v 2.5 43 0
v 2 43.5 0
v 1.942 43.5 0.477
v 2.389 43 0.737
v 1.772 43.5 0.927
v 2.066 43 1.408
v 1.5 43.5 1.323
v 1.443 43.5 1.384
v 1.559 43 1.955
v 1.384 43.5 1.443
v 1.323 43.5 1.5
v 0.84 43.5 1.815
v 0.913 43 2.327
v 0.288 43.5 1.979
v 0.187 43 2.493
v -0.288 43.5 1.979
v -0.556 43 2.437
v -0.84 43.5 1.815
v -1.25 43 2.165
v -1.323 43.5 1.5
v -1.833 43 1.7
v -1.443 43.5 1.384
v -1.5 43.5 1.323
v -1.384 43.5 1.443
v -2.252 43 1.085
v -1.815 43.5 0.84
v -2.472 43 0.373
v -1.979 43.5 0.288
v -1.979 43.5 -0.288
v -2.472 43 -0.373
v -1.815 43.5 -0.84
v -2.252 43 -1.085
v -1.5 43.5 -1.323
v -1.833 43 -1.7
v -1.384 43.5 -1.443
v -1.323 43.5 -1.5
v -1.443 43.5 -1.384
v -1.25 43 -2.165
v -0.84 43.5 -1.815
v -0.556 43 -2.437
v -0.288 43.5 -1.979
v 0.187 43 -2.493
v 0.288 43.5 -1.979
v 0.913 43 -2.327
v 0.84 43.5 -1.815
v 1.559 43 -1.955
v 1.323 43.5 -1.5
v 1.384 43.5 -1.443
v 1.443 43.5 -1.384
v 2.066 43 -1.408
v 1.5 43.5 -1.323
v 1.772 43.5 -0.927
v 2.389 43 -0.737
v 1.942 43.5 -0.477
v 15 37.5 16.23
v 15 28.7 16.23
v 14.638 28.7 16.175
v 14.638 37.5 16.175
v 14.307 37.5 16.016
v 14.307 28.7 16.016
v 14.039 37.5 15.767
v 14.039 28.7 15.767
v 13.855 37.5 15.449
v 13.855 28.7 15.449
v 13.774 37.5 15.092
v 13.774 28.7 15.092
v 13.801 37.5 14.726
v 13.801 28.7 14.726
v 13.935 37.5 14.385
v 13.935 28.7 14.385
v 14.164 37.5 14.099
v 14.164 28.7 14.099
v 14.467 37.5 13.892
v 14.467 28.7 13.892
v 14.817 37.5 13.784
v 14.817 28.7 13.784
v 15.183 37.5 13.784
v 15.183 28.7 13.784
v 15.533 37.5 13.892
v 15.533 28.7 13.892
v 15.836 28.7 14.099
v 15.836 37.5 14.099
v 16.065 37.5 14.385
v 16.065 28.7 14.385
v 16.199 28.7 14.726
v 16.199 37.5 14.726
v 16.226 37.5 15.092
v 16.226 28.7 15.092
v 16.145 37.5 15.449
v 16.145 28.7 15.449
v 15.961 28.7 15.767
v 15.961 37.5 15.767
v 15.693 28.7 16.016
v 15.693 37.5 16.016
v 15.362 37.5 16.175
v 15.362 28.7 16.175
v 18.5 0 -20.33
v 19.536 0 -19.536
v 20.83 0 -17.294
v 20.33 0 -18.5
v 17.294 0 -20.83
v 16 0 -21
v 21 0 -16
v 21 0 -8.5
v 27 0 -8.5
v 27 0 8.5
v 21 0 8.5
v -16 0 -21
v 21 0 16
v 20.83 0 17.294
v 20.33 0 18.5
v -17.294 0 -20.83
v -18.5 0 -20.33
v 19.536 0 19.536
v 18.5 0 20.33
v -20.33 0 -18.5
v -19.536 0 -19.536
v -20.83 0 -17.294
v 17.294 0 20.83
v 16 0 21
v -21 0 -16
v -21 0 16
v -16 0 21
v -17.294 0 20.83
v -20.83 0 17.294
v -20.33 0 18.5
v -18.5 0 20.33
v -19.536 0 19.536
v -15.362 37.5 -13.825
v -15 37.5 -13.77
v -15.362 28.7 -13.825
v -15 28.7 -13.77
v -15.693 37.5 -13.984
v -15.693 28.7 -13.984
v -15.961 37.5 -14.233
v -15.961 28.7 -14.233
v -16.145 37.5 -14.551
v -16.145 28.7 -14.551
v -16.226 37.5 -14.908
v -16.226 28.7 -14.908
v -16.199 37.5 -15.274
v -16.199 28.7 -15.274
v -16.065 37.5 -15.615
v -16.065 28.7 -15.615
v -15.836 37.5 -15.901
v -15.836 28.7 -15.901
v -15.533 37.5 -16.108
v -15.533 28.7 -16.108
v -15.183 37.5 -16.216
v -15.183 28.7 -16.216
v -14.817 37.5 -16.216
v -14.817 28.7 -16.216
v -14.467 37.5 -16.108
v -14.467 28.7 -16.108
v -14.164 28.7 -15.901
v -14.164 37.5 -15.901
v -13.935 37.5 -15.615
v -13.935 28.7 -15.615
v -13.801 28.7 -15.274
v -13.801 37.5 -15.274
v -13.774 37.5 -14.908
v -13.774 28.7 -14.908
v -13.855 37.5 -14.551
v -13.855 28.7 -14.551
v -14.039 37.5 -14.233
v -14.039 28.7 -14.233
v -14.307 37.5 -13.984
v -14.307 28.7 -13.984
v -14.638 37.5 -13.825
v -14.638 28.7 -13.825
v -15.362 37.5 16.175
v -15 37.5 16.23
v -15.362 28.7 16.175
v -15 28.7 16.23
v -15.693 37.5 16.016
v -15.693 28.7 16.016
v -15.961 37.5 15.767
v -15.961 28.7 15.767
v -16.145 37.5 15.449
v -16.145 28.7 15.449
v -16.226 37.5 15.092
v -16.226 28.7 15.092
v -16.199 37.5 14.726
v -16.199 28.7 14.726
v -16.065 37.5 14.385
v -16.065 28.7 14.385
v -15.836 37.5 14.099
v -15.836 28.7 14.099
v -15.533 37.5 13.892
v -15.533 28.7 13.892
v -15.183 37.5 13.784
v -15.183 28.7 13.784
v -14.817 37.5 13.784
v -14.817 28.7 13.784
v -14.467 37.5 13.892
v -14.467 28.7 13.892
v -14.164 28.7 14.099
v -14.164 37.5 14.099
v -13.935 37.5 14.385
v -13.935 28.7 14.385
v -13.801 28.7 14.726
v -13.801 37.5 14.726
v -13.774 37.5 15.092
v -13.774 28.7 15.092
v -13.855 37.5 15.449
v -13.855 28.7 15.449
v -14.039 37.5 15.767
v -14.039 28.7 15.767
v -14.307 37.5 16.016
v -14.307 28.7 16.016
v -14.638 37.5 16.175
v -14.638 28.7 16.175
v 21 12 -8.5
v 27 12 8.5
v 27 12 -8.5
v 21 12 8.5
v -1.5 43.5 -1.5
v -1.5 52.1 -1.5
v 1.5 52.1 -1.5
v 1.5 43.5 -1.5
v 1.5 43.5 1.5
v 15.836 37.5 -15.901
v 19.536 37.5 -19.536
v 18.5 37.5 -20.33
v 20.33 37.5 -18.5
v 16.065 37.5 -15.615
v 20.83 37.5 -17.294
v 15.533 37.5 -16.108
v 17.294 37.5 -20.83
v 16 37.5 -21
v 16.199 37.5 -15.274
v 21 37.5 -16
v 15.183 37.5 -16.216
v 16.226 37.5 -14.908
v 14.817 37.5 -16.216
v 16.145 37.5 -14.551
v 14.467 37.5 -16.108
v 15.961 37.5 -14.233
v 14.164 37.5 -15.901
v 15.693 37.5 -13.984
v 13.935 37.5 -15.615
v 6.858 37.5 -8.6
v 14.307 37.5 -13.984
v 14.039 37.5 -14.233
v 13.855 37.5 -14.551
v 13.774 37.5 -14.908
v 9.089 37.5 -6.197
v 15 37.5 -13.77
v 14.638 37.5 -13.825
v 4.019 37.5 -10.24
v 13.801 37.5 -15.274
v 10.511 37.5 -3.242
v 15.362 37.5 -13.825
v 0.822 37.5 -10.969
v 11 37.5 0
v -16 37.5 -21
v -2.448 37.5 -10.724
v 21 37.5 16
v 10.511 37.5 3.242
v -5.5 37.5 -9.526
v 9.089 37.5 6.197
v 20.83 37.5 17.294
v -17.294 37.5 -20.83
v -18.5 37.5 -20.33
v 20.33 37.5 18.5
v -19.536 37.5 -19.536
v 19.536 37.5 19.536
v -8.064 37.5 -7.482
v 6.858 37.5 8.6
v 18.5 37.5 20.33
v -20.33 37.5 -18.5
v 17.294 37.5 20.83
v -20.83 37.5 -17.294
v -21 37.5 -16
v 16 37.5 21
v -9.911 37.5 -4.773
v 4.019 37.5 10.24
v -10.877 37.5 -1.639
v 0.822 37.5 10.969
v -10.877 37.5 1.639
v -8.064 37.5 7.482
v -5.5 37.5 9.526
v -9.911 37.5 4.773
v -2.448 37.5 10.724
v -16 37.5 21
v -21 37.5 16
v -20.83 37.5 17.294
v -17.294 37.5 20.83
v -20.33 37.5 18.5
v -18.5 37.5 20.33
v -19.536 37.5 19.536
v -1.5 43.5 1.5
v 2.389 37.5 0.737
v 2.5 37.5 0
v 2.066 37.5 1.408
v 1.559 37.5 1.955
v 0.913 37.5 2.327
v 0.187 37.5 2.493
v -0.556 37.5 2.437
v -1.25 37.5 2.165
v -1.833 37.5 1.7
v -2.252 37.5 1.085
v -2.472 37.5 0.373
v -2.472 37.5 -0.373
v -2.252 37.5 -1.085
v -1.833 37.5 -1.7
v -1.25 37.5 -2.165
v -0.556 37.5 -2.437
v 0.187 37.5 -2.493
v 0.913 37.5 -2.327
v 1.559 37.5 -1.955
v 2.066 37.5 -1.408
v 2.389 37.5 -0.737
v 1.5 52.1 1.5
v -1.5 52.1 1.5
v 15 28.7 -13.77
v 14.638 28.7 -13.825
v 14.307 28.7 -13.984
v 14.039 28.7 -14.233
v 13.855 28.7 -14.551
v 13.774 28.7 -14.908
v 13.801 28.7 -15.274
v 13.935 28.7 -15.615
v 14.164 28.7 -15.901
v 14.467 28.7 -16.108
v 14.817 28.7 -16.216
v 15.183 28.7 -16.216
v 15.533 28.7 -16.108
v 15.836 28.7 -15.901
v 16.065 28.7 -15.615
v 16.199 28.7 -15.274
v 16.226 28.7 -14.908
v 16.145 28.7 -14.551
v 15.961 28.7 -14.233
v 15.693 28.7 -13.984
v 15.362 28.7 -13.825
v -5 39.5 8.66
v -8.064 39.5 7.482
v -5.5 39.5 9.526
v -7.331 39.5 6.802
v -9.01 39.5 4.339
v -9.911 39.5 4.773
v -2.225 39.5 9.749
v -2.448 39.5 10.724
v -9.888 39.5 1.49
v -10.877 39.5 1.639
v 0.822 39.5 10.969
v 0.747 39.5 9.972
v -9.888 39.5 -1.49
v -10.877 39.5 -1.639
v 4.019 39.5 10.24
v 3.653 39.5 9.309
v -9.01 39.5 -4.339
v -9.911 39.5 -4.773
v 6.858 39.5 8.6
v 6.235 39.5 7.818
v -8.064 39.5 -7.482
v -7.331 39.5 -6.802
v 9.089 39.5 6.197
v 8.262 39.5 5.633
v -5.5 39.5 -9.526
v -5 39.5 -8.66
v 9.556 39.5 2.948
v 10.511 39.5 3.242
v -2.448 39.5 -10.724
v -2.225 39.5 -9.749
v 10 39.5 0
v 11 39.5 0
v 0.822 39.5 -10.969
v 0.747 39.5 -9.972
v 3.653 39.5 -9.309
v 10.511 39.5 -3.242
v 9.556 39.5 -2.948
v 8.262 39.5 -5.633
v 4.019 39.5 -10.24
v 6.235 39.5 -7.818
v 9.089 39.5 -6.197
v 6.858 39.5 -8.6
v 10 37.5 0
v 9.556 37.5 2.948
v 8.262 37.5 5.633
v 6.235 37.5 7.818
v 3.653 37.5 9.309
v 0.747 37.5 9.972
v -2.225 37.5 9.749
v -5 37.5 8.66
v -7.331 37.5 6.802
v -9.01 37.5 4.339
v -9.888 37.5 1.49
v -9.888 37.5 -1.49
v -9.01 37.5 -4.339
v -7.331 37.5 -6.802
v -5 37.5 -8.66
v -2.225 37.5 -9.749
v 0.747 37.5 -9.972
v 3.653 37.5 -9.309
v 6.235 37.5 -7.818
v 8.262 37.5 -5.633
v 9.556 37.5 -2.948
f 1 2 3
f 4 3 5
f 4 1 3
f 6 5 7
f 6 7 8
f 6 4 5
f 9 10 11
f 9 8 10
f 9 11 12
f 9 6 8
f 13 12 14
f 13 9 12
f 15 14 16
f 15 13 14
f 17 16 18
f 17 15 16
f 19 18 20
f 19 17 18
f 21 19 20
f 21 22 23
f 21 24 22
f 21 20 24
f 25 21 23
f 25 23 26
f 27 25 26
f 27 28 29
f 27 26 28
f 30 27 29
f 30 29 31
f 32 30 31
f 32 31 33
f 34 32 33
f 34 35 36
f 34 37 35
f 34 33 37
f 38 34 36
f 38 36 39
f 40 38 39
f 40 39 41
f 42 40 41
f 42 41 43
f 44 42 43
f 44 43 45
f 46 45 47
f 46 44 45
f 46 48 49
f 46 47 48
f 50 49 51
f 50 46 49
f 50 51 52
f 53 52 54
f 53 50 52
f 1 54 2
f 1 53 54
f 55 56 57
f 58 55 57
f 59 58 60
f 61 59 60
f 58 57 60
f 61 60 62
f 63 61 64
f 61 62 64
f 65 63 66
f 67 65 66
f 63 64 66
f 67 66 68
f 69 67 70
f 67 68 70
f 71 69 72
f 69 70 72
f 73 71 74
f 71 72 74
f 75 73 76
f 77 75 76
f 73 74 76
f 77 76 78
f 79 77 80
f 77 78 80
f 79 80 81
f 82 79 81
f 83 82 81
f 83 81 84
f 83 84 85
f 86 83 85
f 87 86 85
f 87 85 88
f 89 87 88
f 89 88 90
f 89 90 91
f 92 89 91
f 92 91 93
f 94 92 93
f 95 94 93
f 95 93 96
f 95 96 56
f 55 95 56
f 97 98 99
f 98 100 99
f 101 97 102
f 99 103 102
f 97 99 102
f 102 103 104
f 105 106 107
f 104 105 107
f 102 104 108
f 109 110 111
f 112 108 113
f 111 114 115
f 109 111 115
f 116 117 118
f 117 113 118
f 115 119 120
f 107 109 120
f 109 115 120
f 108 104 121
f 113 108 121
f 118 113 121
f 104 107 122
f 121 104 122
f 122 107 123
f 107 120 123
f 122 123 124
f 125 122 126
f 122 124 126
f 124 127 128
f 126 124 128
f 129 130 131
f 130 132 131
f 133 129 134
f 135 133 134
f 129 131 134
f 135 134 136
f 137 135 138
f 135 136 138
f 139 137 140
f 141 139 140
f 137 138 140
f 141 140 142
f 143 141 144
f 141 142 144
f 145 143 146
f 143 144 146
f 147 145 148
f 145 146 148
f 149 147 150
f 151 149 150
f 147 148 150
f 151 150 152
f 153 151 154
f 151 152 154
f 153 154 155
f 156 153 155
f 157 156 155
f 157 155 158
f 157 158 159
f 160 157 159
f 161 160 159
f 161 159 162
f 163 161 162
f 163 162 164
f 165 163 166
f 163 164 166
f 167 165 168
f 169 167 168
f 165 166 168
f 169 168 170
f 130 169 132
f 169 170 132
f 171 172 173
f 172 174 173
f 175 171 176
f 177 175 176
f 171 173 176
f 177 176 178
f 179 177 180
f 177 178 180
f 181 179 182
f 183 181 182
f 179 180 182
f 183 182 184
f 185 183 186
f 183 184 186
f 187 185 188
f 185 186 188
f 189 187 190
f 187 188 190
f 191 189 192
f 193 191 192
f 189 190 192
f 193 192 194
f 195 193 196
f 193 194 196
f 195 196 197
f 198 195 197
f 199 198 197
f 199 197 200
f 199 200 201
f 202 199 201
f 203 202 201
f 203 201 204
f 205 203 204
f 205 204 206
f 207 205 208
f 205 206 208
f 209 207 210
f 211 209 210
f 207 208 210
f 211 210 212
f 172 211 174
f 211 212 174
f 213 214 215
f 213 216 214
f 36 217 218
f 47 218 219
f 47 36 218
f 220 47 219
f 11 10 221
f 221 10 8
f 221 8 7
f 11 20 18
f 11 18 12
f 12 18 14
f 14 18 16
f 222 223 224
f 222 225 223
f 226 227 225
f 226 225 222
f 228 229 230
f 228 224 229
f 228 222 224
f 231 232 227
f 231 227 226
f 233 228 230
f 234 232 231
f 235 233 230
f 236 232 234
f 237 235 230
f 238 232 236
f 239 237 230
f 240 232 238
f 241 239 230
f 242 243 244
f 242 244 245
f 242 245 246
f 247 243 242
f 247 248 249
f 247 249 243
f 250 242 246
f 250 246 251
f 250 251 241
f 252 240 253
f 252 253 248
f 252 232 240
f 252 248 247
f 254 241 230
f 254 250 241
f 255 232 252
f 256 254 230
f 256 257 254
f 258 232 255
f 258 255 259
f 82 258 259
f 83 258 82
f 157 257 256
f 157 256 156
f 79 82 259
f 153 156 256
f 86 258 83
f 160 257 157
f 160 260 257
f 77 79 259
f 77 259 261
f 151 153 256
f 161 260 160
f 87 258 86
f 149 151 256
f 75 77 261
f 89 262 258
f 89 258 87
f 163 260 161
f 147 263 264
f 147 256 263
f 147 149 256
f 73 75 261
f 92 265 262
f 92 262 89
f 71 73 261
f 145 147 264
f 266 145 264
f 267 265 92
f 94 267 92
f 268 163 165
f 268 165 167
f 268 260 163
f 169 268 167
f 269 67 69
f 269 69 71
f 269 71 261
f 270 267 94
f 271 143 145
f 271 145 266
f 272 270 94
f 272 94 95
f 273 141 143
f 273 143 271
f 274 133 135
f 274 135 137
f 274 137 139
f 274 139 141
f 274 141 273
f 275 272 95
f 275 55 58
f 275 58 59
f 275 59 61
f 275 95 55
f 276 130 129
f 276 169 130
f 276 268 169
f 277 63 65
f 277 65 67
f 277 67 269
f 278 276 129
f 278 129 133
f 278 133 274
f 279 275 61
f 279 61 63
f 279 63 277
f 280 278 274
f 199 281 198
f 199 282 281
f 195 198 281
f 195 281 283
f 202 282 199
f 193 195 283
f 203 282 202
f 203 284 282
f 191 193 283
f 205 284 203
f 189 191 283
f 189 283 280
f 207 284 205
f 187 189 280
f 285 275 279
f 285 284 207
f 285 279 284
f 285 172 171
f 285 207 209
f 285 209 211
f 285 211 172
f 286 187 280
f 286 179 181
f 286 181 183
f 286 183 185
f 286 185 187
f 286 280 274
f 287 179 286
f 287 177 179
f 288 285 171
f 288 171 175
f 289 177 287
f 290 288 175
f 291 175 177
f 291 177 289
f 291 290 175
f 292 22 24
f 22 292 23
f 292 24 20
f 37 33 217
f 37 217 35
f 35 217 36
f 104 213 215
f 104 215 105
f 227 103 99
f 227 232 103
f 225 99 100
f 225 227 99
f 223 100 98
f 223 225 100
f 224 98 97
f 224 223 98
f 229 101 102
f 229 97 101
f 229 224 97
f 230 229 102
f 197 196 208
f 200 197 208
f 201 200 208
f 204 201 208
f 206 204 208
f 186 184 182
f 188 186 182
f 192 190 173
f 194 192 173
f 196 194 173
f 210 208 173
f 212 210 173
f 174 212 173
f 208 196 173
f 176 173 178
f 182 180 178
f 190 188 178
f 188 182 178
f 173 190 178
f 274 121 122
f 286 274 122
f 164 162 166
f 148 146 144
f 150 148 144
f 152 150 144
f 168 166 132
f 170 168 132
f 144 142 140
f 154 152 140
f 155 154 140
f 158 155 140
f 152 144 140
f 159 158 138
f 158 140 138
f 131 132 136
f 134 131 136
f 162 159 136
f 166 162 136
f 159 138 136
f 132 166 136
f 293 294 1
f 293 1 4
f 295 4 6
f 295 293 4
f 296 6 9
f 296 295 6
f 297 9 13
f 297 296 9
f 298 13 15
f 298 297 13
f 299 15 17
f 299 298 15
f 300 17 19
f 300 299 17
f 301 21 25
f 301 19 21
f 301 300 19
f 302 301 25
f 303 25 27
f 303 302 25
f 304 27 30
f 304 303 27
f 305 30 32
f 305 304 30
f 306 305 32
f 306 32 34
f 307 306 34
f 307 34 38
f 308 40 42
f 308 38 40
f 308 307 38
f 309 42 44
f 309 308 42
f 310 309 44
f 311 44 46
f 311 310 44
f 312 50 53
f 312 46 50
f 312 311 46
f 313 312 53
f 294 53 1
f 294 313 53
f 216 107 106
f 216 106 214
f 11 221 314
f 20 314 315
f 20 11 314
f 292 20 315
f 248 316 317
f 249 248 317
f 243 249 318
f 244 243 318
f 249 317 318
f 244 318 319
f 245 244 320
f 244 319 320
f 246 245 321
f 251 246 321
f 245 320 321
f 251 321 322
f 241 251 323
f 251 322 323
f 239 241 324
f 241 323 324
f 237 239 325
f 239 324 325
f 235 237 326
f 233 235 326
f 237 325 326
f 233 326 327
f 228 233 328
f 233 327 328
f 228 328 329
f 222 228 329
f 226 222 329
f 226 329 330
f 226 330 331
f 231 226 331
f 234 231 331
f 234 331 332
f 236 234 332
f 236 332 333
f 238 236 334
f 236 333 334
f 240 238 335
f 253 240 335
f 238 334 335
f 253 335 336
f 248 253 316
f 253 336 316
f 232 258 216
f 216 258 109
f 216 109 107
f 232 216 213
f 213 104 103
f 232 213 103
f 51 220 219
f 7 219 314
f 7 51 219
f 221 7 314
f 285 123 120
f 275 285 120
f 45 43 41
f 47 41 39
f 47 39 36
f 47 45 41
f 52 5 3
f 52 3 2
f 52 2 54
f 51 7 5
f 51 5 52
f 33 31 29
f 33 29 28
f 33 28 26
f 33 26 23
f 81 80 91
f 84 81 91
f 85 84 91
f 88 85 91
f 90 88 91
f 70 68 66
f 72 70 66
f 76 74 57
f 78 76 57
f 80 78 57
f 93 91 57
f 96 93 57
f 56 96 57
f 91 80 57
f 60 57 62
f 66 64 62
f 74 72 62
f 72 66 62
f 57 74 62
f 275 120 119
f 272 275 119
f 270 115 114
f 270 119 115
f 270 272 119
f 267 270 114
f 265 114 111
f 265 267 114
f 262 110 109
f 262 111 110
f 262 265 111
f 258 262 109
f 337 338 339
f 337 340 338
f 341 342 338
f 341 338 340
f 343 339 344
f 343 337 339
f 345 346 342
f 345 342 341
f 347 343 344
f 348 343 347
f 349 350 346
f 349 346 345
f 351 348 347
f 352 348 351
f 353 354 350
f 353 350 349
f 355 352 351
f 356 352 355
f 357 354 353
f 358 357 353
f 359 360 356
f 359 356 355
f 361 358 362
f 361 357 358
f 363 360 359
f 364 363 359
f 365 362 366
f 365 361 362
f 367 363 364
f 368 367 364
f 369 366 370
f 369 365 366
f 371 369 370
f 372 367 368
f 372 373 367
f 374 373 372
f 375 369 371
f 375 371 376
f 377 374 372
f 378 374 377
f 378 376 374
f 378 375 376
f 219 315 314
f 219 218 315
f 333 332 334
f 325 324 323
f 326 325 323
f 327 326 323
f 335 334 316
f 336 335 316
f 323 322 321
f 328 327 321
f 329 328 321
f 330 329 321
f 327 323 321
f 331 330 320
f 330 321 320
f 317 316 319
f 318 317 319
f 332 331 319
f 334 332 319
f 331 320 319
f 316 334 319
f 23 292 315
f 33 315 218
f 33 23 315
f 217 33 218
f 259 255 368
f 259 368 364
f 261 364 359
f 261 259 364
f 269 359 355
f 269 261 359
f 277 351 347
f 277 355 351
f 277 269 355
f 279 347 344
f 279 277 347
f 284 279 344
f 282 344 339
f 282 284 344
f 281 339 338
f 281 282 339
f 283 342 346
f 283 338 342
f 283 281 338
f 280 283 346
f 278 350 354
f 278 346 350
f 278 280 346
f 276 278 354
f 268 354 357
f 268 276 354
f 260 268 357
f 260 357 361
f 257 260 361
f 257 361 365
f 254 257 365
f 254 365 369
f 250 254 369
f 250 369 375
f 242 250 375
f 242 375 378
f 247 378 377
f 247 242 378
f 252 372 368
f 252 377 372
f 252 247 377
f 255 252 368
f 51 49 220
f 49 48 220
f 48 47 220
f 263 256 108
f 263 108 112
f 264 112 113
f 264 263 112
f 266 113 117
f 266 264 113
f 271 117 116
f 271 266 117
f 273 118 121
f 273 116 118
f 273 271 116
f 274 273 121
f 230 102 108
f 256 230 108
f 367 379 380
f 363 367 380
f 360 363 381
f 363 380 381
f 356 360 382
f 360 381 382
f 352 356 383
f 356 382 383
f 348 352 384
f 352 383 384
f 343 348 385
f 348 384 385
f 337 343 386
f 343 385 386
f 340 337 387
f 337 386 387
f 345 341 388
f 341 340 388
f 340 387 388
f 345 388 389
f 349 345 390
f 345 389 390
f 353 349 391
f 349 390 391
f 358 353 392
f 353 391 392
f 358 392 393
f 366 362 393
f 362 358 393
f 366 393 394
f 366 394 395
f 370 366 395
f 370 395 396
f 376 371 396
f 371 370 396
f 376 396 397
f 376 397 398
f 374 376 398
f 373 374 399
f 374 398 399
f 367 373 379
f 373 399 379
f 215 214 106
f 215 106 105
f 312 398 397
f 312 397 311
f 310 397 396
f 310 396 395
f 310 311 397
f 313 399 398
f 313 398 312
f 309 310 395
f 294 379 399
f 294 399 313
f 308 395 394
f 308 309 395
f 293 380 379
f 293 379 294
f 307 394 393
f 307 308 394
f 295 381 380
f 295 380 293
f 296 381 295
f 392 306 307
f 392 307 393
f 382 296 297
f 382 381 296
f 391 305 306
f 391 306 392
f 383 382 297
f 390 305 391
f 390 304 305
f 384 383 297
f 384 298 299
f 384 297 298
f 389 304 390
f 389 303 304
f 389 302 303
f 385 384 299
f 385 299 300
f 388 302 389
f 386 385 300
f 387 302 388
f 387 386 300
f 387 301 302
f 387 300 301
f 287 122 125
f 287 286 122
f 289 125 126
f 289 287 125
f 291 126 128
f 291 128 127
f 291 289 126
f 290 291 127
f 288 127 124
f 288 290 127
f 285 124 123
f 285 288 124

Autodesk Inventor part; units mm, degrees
ref_plane "YZ Plane" through (0, 0, 0) normal (1, 0, 0) x (0, 1, 0)
ref_plane "XZ Plane" through (0, 0, 0) normal (0, 1, 0) x (-1, 0, 0)
ref_plane "XY Plane" through (0, 0, 0) normal (0, 0, 1) x (1, 0, 0)
sketch "Sketch1" plane through (0, 0, 0) normal (0, 1, 0) x (-1, 0, 0)
  line L0 (21, 21) -> (-21, 21)
  line L1 (-21, 21) -> (-21, -21)
  line L2 (-21, -21) -> (21, -21)
  line L3 (21, -21) -> (21, 21)
  line L4 (21, 21) -> (-21, -21) construction
  line L5 (-21, 21) -> (21, -21) construction
  point P0 (0, 0)
  dimension "d0" = 42
  dimension "d1" = 42
extrude "Extrusion1" add sketch "Sketch1" along normal blind 37.5
fillet "Fillet1" radius 5 4 edges at (21, 18.75, 21) (21, 18.75, -21) (-21, 18.75, -21) (-21, 18.75, 21)
sketch "Sketch2" plane through (0, 37.5, 0) normal (0, 1, 0) x (1, 0, 0)
  arc A0 (-21, -16) -> (-16, -21) centre (-16, -16) ccw projected
  line L0 (-16, -21) -> (16, -21) projected
  arc A1 (16, -21) -> (21, -16) centre (16, -16) ccw projected
  line L1 (21, -16) -> (21, 16) projected
  arc A2 (21, 16) -> (16, 21) centre (16, 16) ccw projected
  line L2 (16, 21) -> (-16, 21) projected
  arc A3 (-16, 21) -> (-21, 16) centre (-16, 16) ccw projected
  line L3 (-21, 16) -> (-21, -16) projected
  circle A4 centre (0, 0) radius 11
  circle A5 centre (0, 0) radius 10
  point P0 (-15, -15)
  point P1 (15, -15)
  point P2 (15, 15)
  point P3 (-15, 15)
  dimension "d5" = 22
  dimension "d6" = 20
  dimension "d7" = 6
  dimension "d8" = 6
  dimension "d11" = 360
extrude "Extrusion2" add sketch "Sketch2" along normal blind 2 contours A4
hole "Hole1" at (-15, 37.5, 15) at (15, 37.5, 15) at (15, 37.5, -15) at (-15, 37.5, -15) direction (0, -1, 0) diameter 2.459 depth 8.8 thread size "M3x0.5" class "6H" standard "ISO Metric profile"
sketch "Sketch3" plane through (0, 37.5, 0) normal (0, 1, 0) x (1, 0, 0)
  circle A0 centre (0, 0) radius 2.5
  dimension "d22" = 5
extrude "Extrusion3" add sketch "Sketch3" along normal blind 6
chamfer "Chamfer1" distance 0.5 angle 45 1 edges at (-2.5, 43.5, 0)
sketch "Sketch4" plane through (0, 43.5, 0) normal (0, 1, 0) x (1, 0, 0)
  line L0 (-1.5, 1.5) -> (1.5, 1.5)
  line L1 (1.5, 1.5) -> (1.5, -1.5)
  line L2 (1.5, -1.5) -> (-1.5, -1.5)
  line L3 (-1.5, -1.5) -> (-1.5, 1.5)
  line L4 (-1.5, 1.5) -> (1.5, -1.5) construction
  line L5 (1.5, 1.5) -> (-1.5, -1.5) construction
  point P0 (0, 0)
  dimension "d28" = 3
  dimension "d29" = 3
extrude "Extrusion4" add sketch "Sketch4" along normal blind 8.6
sketch "Sketch5" plane through (21, 0, 16) normal (1, 0, 0) x (0, 0, -1)
  line L0 (7.5, 12) -> (24.5, 12)
  line L1 (24.5, 12) -> (24.5, 0)
  line L2 (24.5, 0) -> (7.5, 0)
  line L3 (7.5, 0) -> (7.5, 12)
  line L4 (7.5, 12) -> (24.5, 0) construction
  line L5 (24.5, 12) -> (7.5, 0) construction
  line L6 (0, 0) -> (32, 0) projected
  point P0 (16, 0)
  point P1 (16, 6)
  point P2 (16, 0)
  dimension "d32" = 17
  dimension "d33" = 12
extrude "Extrusion5" add sketch "Sketch5" along normal blind 6
properties part number "steppeSquare"
